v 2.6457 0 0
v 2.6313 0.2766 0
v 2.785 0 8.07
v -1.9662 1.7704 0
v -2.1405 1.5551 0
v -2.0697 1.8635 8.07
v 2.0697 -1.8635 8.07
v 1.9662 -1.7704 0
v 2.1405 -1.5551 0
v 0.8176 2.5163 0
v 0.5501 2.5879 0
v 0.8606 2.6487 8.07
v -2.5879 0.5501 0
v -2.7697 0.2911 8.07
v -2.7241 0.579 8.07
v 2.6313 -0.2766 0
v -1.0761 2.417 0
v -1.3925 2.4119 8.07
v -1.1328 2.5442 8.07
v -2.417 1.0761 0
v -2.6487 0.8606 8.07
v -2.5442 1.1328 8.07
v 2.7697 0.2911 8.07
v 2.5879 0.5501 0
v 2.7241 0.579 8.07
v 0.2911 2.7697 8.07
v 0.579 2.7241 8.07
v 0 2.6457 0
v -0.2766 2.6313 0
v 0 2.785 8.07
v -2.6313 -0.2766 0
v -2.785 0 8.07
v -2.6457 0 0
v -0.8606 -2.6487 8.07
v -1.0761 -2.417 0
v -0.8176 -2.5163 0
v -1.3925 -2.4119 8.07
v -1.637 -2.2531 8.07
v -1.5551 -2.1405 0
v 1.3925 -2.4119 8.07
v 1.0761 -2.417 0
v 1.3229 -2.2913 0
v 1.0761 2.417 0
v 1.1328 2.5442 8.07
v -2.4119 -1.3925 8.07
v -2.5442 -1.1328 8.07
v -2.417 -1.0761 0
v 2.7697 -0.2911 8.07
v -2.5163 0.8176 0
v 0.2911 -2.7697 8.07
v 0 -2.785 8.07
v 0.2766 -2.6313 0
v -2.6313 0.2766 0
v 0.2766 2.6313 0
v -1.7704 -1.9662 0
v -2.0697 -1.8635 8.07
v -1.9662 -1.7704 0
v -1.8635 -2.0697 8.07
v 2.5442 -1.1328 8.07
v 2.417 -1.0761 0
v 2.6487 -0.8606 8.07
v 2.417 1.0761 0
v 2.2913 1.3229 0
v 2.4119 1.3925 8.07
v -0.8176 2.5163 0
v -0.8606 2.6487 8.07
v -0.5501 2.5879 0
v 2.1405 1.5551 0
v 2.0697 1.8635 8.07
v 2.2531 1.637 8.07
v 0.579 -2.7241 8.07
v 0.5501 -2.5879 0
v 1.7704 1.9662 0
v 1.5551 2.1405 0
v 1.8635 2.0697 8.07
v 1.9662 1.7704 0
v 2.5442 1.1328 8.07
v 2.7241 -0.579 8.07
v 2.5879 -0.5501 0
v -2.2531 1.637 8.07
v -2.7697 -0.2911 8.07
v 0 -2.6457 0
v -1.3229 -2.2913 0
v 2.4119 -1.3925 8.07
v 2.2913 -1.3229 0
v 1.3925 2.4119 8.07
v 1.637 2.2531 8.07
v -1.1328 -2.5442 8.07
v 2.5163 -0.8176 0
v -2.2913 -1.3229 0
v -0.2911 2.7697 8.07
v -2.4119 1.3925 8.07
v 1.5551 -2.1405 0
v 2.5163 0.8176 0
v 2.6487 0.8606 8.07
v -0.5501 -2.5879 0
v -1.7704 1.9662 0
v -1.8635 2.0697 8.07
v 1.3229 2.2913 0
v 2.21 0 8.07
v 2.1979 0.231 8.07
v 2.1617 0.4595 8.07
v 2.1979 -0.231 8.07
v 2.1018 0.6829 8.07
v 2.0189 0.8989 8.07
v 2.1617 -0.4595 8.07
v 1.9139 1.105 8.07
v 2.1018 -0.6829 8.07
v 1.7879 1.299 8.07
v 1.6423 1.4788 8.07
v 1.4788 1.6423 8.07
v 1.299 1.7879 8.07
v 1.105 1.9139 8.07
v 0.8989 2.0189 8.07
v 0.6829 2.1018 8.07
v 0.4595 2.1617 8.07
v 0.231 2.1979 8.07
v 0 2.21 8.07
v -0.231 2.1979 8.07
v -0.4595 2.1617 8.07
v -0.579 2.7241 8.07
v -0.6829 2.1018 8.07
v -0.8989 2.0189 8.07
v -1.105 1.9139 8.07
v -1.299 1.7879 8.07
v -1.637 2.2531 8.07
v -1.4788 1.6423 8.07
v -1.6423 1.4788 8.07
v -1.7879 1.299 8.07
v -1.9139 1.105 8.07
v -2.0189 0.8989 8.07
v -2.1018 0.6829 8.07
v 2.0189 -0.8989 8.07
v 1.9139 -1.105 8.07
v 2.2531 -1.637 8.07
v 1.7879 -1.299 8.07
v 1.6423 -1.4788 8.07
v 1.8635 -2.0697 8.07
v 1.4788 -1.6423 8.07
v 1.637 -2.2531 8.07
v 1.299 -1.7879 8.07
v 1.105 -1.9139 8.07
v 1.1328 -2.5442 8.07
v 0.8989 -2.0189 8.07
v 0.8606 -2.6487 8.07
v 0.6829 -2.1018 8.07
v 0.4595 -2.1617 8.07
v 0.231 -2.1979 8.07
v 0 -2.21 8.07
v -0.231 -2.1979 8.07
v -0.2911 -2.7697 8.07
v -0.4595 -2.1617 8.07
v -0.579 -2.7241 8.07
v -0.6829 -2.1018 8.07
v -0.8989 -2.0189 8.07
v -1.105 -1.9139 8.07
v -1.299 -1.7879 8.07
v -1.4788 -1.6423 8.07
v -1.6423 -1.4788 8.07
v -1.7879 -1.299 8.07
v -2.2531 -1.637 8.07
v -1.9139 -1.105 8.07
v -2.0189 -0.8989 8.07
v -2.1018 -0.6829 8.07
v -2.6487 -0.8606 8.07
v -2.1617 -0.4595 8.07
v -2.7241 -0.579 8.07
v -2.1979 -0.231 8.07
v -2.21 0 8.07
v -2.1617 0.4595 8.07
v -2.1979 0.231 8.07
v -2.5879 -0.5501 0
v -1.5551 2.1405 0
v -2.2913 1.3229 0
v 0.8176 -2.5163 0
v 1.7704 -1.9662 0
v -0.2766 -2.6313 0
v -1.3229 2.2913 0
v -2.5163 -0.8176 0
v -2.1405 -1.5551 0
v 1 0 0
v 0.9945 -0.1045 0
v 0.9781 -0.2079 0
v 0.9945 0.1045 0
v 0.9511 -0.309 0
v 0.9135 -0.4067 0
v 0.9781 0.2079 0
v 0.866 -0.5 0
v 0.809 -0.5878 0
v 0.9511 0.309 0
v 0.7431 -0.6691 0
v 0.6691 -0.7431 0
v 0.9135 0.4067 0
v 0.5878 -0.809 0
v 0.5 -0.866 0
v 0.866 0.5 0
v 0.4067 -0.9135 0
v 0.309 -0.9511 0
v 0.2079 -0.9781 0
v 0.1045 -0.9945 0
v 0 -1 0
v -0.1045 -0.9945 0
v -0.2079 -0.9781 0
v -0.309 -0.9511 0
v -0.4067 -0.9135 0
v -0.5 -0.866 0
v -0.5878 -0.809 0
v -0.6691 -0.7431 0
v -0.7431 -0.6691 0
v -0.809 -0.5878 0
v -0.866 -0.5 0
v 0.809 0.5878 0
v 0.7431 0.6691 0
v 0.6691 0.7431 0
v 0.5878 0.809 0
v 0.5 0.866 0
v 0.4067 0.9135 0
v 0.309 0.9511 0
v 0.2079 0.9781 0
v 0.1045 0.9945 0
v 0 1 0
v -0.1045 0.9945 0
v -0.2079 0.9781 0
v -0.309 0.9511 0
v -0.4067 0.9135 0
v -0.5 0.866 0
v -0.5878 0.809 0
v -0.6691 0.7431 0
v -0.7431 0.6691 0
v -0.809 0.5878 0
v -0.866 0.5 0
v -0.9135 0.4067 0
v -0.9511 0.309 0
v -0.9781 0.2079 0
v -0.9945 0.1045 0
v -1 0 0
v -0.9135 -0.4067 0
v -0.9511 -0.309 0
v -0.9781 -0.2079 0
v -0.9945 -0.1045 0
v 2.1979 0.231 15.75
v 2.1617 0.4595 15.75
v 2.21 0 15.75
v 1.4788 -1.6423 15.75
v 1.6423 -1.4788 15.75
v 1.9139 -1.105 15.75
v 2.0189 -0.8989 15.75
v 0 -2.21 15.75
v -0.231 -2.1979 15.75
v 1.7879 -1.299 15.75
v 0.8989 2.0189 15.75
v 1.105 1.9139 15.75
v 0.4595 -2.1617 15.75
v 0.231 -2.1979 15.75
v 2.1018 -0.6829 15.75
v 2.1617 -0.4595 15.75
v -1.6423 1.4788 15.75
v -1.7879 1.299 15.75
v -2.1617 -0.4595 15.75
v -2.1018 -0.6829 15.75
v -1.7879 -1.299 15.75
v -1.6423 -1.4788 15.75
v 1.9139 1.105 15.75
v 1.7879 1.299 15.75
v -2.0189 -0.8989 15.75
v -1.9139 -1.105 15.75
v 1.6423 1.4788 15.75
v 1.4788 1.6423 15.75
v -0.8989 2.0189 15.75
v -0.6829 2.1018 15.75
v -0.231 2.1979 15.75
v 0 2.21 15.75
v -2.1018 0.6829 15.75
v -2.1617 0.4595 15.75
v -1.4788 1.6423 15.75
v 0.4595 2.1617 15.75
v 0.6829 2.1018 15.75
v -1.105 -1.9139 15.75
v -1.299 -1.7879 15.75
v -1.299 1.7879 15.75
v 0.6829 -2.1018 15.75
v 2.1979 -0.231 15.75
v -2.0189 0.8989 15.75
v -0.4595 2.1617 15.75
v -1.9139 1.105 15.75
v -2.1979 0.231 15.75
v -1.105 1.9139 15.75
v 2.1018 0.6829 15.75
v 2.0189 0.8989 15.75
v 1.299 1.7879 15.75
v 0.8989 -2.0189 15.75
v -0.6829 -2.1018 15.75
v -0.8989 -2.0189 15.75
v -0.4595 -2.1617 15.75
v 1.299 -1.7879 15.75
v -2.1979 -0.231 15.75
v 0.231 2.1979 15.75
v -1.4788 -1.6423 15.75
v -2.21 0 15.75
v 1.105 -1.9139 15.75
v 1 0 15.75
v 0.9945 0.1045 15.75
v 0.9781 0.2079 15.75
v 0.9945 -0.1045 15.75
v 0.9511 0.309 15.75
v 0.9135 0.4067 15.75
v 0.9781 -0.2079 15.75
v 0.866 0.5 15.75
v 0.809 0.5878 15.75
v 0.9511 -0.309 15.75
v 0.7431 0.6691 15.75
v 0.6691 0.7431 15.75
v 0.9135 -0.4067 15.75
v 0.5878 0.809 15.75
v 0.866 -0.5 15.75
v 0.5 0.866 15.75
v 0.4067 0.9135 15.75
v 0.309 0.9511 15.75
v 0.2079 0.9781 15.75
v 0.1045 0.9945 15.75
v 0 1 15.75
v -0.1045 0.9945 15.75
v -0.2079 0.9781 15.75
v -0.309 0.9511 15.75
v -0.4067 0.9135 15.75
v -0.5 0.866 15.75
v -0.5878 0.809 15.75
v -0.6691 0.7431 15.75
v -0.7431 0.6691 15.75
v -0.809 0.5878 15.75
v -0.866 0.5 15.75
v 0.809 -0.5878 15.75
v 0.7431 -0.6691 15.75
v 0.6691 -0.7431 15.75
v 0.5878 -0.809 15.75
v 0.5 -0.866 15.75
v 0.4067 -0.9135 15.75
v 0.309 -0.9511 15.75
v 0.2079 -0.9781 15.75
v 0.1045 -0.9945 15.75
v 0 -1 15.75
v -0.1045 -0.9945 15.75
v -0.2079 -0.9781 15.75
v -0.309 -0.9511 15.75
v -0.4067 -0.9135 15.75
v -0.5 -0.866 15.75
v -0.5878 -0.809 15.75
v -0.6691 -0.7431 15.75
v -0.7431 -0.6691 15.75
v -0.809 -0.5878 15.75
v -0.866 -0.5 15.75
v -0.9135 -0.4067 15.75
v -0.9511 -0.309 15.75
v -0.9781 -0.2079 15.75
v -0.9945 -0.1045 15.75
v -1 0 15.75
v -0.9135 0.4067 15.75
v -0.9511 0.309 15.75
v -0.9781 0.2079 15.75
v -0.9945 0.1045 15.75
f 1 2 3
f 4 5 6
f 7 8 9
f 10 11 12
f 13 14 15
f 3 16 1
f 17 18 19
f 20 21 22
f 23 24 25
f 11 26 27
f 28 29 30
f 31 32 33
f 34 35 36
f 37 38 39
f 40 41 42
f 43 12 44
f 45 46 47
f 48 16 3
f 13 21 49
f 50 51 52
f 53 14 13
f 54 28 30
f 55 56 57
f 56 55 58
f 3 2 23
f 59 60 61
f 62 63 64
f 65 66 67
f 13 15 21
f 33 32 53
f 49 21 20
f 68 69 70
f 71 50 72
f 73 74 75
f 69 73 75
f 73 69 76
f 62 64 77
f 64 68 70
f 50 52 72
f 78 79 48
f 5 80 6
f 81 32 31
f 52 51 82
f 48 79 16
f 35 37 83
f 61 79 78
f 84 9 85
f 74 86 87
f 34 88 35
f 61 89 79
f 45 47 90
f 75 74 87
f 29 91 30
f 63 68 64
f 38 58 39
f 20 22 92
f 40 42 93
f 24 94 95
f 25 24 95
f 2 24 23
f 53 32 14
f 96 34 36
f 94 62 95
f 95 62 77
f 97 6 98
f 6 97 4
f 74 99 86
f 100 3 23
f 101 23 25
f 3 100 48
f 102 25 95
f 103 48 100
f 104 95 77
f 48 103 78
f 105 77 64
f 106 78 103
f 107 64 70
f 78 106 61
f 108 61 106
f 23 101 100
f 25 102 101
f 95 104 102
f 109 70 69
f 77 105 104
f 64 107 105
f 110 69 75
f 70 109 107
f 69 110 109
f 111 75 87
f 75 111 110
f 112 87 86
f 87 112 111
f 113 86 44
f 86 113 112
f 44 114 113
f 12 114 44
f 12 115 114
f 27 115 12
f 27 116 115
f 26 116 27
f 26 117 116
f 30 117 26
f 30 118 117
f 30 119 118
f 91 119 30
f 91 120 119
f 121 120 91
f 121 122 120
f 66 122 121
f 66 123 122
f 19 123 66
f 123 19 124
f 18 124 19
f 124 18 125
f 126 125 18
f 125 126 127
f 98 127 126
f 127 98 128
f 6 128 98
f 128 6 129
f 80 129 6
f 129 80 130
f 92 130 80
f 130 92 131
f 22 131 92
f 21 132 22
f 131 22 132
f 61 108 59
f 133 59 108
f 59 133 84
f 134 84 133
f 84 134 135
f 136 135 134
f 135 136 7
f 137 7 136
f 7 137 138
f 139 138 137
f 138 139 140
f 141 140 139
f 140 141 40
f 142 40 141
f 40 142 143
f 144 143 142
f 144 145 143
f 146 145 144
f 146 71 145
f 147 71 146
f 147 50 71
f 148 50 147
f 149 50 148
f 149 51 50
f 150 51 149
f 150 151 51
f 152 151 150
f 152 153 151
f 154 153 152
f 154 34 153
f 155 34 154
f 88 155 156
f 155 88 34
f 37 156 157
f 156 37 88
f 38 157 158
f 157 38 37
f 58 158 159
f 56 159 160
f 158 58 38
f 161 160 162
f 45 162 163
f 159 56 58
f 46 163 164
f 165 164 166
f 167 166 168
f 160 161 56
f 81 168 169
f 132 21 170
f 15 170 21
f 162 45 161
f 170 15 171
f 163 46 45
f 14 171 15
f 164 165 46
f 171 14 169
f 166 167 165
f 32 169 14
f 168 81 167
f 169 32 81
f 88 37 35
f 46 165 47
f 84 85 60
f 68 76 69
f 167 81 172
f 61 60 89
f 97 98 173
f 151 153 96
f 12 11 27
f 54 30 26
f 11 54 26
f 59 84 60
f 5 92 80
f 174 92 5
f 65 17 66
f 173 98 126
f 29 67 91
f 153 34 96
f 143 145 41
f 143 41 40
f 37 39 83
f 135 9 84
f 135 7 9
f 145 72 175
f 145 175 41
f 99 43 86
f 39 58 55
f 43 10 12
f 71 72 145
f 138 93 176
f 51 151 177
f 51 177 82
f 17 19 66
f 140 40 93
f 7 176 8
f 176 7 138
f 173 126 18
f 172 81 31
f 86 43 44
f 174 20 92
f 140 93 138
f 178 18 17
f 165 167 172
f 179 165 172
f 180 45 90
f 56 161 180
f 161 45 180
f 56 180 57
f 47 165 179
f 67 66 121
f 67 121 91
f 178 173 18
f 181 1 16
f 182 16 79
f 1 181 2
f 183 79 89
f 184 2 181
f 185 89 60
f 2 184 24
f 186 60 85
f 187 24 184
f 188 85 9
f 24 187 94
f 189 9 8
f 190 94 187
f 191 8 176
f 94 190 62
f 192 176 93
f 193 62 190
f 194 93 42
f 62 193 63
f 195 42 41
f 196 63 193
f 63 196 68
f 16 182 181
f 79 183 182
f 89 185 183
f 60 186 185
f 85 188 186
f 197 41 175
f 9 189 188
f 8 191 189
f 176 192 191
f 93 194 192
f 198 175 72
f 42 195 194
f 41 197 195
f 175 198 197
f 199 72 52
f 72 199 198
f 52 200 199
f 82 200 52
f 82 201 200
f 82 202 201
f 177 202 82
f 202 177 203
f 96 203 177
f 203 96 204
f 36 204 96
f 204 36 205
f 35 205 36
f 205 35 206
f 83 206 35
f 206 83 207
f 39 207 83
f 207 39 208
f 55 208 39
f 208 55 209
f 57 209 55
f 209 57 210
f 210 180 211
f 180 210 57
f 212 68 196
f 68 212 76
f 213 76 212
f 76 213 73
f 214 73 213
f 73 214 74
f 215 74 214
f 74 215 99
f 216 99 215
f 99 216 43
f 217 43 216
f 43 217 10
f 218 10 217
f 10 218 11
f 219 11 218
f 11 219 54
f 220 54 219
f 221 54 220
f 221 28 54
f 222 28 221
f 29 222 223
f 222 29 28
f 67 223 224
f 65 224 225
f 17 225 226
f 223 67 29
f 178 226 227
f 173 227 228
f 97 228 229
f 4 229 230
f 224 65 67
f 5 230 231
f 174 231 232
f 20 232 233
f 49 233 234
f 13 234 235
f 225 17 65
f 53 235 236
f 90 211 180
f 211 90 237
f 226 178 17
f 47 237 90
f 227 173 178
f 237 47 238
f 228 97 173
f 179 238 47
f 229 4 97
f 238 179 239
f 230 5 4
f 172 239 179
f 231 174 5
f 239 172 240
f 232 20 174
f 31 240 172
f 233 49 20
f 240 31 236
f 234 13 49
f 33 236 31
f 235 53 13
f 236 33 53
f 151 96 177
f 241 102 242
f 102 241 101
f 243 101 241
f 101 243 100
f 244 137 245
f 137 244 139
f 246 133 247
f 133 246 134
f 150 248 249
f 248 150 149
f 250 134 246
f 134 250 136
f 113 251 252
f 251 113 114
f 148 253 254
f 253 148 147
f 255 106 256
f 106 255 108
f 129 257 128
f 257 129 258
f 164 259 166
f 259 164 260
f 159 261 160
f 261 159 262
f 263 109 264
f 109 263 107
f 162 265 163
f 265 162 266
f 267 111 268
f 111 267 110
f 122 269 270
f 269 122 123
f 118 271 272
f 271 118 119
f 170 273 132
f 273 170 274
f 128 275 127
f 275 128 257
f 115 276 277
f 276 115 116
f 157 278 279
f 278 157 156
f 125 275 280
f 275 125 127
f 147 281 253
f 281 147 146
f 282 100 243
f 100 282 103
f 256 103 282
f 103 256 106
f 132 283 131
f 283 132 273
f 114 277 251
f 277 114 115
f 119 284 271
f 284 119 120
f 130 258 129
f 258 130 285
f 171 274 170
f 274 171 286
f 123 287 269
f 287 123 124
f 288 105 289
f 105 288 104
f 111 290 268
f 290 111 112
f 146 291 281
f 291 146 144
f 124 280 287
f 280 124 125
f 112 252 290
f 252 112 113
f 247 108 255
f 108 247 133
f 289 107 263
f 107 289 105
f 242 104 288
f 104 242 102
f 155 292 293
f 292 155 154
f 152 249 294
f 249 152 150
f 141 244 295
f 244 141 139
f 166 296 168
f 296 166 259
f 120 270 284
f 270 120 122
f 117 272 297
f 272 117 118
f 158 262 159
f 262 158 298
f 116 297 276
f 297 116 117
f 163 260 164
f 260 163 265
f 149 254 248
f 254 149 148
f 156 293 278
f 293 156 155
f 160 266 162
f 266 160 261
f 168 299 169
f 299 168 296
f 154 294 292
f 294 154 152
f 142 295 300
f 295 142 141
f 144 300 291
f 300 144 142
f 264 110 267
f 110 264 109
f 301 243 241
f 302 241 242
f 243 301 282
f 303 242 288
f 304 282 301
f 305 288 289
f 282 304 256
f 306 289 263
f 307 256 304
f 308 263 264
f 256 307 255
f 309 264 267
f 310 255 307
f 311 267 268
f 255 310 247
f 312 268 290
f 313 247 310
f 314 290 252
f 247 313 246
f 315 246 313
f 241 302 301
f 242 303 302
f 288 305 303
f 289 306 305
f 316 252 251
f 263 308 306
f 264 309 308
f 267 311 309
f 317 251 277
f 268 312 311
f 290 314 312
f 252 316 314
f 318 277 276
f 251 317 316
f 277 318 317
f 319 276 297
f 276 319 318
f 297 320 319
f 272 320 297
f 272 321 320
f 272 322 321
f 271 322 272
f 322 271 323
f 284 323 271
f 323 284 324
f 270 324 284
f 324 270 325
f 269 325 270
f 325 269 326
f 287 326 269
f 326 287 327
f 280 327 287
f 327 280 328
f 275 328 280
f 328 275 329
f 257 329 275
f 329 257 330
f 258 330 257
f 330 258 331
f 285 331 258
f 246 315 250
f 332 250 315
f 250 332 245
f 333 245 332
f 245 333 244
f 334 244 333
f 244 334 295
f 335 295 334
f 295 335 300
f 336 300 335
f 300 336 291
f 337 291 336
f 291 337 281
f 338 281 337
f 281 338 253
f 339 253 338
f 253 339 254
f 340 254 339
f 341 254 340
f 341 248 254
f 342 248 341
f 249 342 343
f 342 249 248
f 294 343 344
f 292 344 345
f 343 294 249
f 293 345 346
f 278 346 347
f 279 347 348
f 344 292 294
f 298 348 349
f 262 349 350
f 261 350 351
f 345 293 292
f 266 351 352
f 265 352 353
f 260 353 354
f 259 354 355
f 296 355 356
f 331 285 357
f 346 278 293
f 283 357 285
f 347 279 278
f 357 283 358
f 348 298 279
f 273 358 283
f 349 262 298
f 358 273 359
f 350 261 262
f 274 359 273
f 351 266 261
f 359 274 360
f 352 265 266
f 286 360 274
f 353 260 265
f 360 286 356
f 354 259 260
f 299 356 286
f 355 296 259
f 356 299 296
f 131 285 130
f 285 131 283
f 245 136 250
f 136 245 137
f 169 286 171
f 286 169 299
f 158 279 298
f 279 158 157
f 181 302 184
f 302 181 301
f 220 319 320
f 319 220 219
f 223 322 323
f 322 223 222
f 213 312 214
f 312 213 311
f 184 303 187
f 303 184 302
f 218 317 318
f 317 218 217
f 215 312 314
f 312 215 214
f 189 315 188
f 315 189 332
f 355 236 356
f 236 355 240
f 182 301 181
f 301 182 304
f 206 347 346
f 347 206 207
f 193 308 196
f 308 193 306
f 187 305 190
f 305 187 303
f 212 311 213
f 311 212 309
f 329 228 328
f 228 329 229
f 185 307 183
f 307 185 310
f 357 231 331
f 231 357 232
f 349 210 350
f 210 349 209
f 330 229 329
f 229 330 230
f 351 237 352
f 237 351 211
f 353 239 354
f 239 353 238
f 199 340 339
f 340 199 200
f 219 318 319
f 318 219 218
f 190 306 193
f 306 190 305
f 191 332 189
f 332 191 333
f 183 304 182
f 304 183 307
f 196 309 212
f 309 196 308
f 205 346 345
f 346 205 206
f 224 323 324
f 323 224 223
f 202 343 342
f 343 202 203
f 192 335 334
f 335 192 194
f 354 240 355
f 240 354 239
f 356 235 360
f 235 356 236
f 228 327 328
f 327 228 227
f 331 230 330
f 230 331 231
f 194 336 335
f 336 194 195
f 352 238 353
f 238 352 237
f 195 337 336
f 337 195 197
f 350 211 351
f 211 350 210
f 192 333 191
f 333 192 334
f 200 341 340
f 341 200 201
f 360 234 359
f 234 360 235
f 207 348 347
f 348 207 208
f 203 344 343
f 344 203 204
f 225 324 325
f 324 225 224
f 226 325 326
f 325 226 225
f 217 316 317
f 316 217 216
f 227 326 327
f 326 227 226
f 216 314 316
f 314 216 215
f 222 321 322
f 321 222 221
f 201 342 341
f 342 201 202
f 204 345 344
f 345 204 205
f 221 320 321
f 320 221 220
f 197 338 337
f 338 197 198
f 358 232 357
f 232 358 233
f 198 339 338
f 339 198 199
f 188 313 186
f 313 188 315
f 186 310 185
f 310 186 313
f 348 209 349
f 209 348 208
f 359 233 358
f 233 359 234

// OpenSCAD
//Author: Paul J White
//Date: 4/23/22
//Purpose: Have and editible pen ink adapter
//Note: All Mesaurements are in Millimeters

//How far you want it to go into the pen
iHeight = 7.68;
//How far you want to make the top of the head
pHeight = 8.07;
//Inner diam of you ink cartridge 
iDiam   = 4.42;
//Diam for the stopper on the pen
pDiam   = 5.57;
//Diam for the hole in the middle
sDiam = 1;
//How good of a cylander do you want (Higher is more circular)
res = 60;
//How much to taper the pen insert (lower is more)
taper = .95;


//-----Maths------
iRad = iDiam /2;
pRad = pDiam /2;


difference(){
    union()
    {
        //Insert into Pen
        cylinder($fn =res, h=pHeight, r1=pRad*taper, r2=pRad);
       

        //top
        translate([0,0,pHeight])
        {
            //insert into ink
            cylinder($fn =res, h=iHeight, r=iRad);
        }
    }
    //Safety hole
    cylinder($fn = res, h=iHeight+pHeight+1, r=sDiam);
}
